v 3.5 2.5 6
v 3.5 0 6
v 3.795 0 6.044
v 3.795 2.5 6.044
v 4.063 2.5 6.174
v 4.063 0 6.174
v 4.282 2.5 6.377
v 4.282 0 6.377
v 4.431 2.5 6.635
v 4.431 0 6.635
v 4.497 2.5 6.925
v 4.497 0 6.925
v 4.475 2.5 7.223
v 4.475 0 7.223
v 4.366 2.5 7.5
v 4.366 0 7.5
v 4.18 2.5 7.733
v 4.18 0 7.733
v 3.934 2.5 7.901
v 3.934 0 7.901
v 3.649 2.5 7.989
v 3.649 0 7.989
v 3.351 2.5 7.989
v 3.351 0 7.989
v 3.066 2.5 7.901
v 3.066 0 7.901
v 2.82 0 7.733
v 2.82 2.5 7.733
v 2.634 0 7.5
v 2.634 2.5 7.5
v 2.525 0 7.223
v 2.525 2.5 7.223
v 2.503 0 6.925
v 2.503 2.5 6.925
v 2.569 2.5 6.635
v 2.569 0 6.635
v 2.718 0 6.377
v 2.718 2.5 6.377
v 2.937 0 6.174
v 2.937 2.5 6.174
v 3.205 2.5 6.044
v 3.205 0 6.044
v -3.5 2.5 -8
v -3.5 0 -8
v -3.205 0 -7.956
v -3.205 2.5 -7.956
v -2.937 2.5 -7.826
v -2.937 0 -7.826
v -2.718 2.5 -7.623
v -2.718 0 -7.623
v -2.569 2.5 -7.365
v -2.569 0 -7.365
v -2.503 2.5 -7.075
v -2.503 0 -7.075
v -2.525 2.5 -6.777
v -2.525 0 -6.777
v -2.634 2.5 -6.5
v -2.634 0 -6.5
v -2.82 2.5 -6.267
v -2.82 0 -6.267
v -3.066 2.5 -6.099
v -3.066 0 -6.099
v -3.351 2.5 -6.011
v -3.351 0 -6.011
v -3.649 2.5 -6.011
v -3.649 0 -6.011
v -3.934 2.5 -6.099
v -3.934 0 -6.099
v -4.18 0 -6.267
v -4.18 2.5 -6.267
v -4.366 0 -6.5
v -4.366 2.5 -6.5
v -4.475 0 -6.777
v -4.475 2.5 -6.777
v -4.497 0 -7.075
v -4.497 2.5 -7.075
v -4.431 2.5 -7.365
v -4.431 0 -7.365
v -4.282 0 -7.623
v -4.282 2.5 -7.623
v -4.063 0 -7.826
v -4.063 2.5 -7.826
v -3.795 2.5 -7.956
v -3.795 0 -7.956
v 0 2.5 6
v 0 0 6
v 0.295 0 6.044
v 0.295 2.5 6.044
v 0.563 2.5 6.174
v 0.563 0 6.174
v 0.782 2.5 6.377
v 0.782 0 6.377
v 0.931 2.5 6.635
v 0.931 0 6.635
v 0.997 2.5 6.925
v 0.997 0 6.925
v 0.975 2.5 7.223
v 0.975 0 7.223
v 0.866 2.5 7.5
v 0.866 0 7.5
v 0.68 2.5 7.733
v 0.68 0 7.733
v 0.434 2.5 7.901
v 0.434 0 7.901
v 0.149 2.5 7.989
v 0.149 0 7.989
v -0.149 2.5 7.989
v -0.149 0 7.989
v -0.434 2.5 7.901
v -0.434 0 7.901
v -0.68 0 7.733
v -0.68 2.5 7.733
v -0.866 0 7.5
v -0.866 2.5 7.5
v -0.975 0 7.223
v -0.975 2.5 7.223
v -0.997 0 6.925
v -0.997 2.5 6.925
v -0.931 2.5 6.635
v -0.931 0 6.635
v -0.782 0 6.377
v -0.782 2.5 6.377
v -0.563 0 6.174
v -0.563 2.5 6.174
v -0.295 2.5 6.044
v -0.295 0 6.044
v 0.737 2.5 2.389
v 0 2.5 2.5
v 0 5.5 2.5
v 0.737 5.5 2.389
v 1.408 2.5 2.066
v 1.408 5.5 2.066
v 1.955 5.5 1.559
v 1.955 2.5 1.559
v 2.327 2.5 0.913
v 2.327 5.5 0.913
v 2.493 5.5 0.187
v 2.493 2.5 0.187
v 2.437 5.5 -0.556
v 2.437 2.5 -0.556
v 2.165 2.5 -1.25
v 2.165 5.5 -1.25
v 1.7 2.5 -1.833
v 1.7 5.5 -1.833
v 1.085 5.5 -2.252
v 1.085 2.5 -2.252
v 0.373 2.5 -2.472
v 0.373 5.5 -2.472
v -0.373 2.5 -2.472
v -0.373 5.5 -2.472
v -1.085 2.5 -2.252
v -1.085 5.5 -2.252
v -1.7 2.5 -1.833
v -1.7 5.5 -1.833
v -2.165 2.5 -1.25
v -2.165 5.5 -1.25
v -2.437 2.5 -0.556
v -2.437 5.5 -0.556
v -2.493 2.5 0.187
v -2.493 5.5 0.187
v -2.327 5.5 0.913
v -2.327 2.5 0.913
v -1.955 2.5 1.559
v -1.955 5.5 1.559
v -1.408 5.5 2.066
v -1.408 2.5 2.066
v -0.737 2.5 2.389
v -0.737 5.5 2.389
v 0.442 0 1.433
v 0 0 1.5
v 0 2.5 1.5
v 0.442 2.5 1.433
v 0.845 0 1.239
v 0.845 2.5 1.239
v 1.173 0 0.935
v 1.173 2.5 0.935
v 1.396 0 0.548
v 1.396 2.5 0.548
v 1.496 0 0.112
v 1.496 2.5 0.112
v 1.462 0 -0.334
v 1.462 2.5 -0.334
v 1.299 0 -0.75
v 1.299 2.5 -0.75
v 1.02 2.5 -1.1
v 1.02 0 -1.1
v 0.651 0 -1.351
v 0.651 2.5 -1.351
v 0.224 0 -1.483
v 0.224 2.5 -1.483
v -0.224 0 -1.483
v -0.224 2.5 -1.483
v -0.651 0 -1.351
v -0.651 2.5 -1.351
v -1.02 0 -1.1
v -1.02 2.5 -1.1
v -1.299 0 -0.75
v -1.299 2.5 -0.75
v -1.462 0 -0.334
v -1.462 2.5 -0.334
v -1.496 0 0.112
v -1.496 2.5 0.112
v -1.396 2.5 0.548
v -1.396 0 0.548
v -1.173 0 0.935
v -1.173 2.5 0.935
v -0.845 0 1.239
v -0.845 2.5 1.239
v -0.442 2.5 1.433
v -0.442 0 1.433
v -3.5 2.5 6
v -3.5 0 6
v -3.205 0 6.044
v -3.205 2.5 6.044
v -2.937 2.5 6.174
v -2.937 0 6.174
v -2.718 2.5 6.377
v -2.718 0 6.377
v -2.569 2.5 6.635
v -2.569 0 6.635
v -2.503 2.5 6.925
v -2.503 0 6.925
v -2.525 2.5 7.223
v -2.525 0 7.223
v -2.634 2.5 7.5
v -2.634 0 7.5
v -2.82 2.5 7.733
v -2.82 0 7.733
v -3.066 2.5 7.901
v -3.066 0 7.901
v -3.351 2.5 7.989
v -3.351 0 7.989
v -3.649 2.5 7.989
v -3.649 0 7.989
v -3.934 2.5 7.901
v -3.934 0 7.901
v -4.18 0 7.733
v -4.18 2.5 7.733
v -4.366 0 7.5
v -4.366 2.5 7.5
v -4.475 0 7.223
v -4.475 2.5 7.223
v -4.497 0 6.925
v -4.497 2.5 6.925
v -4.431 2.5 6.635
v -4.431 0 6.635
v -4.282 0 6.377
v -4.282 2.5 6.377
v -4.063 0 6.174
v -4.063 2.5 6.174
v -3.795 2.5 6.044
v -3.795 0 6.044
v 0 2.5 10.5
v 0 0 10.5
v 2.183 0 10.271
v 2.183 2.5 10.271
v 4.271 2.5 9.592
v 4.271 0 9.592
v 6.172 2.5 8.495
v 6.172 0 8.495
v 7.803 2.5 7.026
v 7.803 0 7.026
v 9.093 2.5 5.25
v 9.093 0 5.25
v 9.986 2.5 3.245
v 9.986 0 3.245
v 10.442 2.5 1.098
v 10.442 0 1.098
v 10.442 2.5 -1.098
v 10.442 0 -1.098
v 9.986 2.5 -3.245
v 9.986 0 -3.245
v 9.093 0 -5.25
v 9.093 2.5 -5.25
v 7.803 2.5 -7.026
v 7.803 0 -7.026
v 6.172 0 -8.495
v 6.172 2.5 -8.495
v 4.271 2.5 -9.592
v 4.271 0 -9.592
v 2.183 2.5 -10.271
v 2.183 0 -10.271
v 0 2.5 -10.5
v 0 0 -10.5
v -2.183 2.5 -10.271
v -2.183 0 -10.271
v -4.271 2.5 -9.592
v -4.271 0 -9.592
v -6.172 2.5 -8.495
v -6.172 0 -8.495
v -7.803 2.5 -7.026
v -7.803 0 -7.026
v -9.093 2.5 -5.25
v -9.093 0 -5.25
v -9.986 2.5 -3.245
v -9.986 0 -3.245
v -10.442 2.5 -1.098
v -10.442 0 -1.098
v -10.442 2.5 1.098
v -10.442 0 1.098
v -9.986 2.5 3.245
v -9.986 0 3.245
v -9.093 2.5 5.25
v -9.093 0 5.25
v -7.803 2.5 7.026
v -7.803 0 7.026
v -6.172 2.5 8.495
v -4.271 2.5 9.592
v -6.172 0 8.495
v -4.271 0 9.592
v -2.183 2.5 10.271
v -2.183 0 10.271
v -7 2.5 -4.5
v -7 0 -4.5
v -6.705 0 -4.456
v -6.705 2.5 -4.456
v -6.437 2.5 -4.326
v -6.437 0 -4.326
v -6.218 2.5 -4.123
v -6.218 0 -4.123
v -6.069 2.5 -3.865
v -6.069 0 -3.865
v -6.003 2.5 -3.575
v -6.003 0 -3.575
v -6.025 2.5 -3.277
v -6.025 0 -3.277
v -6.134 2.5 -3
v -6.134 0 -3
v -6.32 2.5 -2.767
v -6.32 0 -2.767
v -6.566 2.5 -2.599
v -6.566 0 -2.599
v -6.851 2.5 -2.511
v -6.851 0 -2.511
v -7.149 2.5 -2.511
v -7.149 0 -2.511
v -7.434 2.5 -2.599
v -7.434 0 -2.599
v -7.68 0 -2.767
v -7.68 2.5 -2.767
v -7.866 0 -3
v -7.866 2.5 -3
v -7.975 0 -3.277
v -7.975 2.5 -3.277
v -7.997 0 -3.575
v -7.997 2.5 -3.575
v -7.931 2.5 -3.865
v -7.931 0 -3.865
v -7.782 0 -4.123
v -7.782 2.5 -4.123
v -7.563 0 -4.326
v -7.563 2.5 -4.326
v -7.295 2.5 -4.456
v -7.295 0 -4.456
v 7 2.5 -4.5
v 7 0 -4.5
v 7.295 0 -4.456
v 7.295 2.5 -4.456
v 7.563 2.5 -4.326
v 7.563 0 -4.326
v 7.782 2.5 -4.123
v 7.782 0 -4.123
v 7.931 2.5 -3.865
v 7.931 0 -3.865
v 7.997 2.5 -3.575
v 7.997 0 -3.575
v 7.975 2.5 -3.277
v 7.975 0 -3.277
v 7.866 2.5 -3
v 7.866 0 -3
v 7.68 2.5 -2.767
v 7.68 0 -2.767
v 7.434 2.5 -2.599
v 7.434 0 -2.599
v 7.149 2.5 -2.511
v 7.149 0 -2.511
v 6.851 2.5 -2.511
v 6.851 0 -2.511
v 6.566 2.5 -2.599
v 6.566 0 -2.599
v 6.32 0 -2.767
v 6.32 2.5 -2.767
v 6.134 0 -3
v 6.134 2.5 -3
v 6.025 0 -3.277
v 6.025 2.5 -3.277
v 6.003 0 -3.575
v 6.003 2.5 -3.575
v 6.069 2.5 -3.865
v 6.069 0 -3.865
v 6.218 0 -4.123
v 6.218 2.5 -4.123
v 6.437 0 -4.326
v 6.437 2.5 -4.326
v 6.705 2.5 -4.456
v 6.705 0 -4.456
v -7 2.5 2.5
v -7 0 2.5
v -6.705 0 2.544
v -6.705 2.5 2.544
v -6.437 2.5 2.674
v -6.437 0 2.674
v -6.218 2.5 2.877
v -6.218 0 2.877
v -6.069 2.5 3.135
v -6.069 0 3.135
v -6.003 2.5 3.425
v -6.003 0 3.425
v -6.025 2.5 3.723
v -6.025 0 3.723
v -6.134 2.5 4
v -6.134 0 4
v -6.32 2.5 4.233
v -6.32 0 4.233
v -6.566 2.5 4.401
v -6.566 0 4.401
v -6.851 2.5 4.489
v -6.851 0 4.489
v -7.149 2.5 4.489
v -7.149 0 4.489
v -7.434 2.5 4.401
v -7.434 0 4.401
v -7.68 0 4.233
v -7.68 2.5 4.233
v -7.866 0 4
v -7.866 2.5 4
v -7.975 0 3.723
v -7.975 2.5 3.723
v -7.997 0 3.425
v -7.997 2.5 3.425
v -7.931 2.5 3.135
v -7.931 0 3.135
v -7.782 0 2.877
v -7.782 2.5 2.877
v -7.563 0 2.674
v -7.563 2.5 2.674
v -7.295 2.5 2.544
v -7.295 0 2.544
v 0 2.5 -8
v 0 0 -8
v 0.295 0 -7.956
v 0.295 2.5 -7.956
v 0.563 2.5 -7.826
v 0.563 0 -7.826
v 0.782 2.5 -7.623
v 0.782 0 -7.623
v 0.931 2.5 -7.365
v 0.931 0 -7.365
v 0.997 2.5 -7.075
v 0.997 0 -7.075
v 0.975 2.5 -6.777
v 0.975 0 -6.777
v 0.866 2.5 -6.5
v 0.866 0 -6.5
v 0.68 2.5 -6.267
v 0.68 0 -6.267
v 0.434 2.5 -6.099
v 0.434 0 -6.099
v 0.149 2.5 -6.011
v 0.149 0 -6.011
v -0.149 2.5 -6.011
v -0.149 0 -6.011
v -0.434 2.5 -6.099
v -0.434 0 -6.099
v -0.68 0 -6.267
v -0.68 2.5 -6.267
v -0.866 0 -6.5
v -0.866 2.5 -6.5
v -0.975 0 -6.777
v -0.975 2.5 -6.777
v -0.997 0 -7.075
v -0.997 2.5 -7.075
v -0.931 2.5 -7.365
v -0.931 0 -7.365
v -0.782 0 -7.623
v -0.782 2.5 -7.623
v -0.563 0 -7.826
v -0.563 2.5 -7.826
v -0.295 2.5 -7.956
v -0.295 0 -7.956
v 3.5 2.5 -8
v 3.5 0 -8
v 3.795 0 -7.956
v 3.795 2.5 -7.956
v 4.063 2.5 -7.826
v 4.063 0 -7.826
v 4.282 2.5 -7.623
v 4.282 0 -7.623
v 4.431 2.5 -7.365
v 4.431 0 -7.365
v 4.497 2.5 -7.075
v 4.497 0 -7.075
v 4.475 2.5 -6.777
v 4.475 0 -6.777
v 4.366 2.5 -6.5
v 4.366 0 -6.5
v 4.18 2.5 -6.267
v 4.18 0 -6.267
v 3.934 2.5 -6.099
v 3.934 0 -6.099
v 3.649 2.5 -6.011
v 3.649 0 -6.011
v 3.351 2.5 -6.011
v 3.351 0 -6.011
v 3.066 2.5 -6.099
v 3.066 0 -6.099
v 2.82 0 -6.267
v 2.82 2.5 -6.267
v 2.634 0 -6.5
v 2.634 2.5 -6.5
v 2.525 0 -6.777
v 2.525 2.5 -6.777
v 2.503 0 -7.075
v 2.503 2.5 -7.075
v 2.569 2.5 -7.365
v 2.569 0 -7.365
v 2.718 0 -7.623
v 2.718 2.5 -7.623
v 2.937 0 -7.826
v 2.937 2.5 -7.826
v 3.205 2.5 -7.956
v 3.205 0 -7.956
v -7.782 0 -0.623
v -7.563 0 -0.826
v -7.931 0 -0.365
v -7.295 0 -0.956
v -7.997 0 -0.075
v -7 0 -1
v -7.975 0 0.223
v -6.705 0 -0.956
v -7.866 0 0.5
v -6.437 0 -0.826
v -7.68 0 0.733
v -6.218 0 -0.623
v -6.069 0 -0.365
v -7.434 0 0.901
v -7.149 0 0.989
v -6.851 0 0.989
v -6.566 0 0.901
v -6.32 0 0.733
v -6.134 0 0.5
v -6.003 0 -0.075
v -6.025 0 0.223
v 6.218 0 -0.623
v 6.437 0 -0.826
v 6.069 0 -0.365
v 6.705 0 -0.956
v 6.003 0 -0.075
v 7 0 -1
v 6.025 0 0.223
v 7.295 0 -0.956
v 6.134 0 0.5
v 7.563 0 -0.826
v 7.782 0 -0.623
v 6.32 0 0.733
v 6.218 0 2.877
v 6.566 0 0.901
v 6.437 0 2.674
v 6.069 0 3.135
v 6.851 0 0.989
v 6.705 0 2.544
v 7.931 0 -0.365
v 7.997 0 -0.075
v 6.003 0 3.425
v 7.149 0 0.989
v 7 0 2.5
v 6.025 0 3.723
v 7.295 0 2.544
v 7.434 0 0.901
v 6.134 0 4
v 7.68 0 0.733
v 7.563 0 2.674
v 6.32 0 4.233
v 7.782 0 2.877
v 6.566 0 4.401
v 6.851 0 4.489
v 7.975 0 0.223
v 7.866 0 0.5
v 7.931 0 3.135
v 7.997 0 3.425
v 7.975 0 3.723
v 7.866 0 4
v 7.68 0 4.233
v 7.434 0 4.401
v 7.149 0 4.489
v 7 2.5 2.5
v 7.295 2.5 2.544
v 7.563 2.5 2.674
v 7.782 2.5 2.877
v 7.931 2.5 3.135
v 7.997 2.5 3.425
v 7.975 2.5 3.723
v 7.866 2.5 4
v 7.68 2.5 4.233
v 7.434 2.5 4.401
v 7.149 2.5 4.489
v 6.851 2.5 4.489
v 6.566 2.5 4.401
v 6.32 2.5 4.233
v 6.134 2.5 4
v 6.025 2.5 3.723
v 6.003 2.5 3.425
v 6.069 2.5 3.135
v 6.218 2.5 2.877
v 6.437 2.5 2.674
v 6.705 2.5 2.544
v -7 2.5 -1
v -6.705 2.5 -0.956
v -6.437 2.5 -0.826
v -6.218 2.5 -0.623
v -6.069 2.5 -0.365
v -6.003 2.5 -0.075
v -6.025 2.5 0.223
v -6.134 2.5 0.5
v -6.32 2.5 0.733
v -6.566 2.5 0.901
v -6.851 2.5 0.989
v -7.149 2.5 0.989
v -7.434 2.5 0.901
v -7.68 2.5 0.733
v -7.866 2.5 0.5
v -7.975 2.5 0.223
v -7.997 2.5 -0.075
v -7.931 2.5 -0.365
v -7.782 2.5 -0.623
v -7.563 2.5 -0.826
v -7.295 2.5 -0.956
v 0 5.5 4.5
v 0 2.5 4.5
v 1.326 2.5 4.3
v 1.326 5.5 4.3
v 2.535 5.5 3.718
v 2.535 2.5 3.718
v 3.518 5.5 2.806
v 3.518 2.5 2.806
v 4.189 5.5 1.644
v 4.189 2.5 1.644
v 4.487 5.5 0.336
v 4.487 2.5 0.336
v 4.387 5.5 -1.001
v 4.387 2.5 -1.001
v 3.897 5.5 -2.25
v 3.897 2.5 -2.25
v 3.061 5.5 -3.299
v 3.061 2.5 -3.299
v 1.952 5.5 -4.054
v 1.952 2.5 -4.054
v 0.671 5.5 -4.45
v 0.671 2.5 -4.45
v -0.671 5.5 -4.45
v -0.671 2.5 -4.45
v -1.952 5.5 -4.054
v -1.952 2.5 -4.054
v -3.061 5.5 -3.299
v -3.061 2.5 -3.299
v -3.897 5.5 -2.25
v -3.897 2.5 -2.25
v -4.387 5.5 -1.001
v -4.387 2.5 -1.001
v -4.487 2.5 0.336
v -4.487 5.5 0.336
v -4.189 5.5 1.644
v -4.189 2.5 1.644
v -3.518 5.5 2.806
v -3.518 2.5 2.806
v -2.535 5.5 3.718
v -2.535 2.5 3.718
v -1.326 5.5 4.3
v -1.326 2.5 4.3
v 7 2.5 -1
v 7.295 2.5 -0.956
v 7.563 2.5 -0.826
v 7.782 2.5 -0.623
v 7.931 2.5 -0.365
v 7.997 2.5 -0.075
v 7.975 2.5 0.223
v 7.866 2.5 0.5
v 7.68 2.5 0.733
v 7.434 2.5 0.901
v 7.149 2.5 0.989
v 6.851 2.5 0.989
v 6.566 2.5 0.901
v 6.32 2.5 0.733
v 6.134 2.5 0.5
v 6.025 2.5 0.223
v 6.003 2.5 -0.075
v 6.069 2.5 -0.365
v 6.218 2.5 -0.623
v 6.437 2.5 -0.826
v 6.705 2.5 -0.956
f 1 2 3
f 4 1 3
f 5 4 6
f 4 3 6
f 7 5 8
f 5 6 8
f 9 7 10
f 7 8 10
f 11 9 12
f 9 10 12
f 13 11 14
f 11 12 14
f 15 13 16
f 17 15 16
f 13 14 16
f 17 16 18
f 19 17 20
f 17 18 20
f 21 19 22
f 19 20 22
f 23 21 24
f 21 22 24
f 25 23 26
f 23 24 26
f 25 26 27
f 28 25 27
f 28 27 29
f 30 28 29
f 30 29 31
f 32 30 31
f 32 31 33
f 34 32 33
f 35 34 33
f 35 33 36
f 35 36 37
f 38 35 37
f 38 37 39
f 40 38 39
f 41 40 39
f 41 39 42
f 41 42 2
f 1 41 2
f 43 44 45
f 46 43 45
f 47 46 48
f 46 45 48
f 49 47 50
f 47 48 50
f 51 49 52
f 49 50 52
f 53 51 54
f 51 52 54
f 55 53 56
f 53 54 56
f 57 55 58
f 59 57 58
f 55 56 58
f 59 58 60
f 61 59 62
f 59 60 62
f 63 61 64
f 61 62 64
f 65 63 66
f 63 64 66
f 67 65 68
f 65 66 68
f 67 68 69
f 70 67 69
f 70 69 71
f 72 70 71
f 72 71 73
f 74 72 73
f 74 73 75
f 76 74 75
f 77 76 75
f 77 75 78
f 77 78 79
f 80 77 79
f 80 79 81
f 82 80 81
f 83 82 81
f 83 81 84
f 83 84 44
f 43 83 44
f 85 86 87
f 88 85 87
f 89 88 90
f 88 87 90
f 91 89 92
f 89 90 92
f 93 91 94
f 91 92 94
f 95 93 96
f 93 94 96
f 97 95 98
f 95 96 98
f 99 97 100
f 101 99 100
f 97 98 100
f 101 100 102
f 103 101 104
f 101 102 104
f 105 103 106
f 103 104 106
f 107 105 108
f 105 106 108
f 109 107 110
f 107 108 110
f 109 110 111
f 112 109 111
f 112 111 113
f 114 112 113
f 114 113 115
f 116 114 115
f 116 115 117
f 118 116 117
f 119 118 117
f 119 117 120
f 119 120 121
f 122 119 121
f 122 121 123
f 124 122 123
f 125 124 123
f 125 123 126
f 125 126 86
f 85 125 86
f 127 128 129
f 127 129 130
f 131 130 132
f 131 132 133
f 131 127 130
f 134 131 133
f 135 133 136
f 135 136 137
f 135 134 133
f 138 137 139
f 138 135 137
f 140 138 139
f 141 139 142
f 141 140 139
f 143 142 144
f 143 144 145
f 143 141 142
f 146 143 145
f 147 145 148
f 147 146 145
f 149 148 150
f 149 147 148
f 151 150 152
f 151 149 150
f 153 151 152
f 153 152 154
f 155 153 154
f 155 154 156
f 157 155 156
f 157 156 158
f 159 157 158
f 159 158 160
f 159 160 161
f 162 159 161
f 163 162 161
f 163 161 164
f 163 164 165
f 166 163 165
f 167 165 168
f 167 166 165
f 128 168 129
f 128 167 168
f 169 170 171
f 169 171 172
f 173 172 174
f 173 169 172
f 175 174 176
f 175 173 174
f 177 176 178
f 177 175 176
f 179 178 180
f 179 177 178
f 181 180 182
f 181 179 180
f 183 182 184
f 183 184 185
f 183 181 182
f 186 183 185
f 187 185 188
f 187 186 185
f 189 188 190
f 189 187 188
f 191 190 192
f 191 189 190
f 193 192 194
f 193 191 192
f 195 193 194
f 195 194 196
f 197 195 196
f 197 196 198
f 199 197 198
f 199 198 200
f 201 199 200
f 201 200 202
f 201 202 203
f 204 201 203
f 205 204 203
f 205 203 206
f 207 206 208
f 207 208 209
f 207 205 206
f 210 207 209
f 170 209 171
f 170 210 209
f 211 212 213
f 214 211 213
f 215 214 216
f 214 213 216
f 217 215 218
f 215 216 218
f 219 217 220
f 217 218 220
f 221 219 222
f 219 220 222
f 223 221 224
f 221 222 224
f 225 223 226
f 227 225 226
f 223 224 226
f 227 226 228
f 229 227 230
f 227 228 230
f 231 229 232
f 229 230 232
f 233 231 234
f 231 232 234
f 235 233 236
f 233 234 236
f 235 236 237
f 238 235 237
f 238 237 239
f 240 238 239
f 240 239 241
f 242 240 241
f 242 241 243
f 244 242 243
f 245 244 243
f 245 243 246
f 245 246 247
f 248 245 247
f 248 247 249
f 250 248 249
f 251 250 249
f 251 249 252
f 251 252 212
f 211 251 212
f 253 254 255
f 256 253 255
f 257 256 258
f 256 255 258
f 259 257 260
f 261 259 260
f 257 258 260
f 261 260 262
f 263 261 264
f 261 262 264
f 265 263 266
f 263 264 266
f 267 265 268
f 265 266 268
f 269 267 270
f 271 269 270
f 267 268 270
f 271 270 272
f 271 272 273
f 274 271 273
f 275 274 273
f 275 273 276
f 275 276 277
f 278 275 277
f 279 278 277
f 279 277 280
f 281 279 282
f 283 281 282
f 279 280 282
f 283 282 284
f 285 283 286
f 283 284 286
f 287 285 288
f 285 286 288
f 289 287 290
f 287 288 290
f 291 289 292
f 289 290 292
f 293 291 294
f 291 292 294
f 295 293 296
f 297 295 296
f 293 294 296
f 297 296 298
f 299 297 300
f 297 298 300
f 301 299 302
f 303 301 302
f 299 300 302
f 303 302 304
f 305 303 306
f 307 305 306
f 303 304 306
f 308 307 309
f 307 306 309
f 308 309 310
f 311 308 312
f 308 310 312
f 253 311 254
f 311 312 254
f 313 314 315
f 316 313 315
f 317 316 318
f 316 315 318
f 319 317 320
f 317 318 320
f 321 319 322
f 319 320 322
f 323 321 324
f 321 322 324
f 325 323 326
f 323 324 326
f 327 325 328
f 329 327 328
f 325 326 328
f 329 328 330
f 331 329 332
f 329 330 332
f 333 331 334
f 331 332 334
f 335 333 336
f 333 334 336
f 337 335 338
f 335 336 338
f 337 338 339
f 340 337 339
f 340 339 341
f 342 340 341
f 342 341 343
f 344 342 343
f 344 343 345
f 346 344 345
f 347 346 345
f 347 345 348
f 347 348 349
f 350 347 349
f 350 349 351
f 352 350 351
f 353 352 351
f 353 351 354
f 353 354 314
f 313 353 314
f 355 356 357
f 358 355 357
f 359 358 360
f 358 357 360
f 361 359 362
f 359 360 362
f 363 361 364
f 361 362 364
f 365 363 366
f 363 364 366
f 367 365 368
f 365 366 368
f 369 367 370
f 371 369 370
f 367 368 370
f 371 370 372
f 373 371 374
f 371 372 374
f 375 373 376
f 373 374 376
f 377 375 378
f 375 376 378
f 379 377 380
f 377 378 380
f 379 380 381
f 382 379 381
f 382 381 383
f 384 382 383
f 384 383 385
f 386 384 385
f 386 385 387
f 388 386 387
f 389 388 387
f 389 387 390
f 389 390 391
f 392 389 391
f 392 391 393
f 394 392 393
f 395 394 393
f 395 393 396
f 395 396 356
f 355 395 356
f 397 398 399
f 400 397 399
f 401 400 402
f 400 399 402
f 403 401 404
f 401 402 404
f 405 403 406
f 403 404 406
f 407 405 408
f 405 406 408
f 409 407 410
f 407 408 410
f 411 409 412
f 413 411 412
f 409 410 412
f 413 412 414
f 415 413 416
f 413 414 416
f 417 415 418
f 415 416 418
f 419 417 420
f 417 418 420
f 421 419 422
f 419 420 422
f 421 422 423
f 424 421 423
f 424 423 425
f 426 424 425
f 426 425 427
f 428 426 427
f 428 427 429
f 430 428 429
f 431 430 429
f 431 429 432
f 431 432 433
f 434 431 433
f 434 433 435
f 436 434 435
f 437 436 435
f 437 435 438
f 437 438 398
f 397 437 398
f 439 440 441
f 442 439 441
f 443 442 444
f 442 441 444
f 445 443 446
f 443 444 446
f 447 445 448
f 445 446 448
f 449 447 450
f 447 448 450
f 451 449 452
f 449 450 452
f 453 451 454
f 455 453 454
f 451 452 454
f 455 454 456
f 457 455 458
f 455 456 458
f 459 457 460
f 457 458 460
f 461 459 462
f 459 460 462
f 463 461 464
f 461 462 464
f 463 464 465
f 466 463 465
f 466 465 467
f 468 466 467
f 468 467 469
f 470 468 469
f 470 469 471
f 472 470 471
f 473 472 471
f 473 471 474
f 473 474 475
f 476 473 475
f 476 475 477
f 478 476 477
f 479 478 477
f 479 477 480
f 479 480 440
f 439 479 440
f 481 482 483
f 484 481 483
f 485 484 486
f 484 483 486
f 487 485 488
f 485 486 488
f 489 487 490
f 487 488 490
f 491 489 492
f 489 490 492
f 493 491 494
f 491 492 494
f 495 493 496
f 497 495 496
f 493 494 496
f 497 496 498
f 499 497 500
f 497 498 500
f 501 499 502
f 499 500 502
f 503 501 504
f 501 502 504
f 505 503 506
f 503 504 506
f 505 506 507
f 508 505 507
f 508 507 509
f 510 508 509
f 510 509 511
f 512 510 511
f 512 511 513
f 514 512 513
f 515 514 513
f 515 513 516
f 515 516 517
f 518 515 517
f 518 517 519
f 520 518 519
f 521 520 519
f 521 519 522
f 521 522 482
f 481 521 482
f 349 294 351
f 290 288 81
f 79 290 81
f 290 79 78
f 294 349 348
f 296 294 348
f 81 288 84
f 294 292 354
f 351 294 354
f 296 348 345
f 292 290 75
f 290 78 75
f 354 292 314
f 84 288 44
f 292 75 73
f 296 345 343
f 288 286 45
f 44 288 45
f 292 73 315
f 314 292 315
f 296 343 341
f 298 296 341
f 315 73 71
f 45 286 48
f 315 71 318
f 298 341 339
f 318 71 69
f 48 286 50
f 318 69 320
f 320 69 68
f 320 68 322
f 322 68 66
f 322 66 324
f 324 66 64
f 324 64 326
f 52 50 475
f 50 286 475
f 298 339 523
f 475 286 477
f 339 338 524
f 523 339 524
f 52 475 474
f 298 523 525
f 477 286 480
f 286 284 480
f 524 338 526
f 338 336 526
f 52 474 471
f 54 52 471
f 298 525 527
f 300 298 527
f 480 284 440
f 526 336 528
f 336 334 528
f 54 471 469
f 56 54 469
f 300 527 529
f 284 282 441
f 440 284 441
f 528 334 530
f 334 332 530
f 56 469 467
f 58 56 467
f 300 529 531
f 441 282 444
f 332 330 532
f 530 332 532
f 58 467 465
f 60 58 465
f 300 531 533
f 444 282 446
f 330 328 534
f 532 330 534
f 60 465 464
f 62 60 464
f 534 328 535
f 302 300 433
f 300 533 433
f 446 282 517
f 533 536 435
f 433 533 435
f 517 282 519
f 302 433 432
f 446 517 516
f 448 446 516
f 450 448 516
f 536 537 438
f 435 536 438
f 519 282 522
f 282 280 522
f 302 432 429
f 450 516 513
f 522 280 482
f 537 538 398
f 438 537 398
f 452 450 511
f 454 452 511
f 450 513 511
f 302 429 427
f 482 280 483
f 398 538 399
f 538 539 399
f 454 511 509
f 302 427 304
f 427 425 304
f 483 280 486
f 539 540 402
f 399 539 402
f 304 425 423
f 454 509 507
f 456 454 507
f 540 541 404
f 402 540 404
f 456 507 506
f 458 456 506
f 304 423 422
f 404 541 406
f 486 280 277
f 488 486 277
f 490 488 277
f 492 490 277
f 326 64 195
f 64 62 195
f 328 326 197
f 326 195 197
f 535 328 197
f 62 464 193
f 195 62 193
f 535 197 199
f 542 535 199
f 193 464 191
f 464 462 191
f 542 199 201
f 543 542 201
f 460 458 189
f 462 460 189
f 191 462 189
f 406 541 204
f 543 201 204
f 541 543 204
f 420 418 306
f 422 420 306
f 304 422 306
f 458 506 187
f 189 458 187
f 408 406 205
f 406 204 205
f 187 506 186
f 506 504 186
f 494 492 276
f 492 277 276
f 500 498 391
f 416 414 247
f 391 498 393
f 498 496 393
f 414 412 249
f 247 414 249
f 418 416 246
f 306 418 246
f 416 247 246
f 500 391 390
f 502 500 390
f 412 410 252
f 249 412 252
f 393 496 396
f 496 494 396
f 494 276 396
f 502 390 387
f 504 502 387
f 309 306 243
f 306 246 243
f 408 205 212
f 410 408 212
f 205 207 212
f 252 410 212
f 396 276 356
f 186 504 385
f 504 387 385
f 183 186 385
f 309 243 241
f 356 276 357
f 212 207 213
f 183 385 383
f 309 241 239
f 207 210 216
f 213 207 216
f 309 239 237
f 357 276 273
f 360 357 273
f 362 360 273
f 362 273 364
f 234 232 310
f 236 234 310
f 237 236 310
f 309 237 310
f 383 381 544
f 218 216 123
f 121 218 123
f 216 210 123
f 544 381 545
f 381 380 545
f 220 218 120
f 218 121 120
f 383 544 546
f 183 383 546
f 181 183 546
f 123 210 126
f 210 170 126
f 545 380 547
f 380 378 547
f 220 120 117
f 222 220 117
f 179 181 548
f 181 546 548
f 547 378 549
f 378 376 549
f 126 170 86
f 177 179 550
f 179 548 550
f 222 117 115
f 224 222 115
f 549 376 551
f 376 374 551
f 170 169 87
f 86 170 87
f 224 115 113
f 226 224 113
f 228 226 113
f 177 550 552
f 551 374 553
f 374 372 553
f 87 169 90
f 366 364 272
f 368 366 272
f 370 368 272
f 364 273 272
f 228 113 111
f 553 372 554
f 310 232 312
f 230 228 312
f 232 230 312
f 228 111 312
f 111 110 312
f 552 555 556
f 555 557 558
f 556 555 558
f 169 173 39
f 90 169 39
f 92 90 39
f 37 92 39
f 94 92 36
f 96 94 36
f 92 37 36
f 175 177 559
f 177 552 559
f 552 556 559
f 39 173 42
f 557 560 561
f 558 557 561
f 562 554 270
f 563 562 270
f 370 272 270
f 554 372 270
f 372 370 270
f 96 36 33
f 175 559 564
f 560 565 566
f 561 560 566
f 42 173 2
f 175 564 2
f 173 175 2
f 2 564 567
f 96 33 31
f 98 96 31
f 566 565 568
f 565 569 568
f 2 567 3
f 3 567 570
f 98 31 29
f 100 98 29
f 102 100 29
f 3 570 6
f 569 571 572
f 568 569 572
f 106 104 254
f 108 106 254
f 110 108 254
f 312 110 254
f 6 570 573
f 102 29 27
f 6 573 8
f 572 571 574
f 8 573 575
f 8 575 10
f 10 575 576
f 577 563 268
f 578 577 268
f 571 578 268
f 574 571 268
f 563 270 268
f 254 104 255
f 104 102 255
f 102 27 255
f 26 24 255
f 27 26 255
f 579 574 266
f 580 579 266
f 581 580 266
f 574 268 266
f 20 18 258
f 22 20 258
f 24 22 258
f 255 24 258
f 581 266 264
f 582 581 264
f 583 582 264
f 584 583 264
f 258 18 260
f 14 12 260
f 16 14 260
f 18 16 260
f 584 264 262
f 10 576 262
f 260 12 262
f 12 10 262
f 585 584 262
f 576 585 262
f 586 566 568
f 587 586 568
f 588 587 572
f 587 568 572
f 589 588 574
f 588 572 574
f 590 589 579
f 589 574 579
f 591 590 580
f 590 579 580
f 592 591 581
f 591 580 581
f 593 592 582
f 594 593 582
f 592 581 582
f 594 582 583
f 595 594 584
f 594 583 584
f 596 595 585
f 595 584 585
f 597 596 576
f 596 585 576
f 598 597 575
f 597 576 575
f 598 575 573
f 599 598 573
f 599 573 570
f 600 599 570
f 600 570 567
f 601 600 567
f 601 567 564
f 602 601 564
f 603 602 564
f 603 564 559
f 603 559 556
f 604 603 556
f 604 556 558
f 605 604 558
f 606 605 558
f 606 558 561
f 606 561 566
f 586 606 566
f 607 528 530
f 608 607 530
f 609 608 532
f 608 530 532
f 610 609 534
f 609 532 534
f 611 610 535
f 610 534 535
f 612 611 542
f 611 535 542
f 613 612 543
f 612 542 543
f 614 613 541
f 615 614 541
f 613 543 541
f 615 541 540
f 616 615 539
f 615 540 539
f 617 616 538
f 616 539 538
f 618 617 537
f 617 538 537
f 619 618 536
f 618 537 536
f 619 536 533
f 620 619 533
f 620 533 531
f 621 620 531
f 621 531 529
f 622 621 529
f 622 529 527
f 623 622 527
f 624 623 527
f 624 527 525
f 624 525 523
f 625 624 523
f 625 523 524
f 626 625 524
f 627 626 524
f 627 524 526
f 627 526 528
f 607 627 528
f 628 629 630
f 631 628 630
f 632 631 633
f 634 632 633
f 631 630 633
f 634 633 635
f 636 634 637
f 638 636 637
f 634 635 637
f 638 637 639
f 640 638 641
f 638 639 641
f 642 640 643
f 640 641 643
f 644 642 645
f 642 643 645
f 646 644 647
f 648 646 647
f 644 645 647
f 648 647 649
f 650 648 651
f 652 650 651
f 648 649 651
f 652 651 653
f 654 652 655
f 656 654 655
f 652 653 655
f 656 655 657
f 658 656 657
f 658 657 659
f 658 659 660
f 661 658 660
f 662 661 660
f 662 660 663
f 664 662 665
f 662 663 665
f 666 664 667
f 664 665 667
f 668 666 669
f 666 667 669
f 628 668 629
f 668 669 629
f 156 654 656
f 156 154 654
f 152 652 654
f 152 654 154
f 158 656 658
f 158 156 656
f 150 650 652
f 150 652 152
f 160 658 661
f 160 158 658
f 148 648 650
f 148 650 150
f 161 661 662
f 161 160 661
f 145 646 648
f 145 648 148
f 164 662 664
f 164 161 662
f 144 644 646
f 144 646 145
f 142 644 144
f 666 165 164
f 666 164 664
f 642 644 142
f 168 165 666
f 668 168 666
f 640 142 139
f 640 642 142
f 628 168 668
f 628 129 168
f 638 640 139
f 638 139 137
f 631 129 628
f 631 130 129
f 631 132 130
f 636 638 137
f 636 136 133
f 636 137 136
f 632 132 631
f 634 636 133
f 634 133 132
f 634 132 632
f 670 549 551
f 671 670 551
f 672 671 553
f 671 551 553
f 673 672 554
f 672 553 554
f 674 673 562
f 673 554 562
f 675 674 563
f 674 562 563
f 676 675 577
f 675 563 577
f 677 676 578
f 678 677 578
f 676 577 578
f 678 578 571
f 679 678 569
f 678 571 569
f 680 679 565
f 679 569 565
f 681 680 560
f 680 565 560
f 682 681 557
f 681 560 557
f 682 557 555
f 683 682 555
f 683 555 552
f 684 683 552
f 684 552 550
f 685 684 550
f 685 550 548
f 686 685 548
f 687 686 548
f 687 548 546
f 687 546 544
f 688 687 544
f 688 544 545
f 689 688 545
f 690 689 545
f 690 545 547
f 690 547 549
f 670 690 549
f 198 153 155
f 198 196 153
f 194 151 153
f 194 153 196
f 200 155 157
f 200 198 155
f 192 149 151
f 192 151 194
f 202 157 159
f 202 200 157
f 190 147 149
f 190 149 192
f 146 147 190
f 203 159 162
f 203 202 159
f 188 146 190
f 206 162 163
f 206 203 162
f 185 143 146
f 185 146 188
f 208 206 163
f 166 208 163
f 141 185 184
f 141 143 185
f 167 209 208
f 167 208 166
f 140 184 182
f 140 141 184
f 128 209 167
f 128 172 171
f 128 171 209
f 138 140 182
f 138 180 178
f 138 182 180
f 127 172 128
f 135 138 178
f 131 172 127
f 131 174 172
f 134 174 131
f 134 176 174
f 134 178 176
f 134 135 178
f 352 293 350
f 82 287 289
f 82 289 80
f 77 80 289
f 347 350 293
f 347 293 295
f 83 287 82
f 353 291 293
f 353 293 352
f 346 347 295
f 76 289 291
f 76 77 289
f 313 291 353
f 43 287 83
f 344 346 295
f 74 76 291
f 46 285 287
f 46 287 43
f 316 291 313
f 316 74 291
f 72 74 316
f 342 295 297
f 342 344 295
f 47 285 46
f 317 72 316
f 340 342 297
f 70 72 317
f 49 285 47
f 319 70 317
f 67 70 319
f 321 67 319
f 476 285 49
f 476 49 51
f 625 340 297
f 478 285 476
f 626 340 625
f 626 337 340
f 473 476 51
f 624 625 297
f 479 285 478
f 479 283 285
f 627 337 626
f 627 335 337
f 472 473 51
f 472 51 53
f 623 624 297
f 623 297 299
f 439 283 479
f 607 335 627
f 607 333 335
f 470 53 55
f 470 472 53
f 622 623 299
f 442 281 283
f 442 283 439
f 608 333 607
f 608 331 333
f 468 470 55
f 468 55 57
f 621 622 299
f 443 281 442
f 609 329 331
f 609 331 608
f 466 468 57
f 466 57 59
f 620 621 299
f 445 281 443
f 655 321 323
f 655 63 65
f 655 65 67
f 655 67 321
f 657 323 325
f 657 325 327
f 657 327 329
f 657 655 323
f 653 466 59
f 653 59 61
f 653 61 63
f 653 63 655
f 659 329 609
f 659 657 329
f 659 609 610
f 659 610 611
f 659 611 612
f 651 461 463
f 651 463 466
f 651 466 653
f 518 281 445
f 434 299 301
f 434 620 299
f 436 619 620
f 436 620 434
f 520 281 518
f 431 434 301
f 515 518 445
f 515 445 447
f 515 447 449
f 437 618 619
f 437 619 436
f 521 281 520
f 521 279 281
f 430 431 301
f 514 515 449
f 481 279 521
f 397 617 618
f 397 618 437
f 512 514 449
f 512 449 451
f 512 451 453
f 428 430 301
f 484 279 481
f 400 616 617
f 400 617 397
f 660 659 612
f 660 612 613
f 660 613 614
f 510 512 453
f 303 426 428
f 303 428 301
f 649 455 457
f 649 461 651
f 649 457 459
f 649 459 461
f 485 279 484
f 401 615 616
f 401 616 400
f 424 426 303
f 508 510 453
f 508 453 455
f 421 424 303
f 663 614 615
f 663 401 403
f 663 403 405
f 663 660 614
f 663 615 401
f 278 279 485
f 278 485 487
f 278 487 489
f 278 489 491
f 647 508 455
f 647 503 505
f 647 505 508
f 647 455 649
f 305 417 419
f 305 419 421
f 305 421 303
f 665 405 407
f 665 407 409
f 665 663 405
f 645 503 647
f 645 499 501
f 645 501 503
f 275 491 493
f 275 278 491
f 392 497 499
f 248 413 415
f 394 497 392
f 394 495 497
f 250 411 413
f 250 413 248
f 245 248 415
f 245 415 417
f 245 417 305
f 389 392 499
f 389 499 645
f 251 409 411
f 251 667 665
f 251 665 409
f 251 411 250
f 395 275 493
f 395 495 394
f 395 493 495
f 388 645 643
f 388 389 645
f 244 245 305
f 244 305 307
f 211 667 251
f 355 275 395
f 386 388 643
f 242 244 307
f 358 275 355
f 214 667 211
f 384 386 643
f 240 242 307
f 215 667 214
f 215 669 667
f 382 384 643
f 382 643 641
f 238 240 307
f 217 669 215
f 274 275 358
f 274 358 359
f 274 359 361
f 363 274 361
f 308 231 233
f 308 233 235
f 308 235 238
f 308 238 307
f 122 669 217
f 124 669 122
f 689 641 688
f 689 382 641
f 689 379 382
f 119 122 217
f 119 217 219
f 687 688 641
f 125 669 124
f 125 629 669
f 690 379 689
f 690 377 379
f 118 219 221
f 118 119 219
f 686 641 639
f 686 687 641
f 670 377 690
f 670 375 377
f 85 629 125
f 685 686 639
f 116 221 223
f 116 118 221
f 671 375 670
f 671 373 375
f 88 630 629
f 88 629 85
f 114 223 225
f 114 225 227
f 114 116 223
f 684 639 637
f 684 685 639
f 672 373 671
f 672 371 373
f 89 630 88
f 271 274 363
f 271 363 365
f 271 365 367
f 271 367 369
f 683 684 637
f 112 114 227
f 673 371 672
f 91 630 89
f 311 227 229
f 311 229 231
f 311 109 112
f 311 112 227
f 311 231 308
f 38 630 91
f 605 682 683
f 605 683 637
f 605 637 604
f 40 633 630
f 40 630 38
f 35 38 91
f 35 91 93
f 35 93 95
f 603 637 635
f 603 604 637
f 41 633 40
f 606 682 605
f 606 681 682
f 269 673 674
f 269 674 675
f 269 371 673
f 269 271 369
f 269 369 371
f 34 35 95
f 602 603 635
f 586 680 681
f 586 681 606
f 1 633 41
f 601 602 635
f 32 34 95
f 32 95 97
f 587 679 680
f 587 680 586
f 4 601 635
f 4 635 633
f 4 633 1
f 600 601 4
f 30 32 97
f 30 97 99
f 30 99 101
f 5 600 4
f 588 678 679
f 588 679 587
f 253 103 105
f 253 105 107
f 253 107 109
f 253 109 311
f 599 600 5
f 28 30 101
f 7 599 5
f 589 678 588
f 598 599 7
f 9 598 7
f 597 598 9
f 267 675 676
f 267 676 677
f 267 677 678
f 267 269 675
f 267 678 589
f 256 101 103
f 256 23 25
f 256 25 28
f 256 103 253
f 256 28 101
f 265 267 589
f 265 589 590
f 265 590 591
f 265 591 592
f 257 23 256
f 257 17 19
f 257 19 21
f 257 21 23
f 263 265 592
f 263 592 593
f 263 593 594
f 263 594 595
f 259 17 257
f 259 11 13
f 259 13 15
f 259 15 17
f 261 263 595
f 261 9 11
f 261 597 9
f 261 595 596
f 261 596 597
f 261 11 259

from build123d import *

# Parameters (mm, degrees)
SKETCH1_R           = 10.5
SKETCH1_R_2         = 1.5
BOSS_EXTRUDE1_DEPTH = 2.5
SKETCH2_R           = 4.5
SKETCH2_R_2         = 2.5
BOSS_EXTRUDE2_DEPTH = 3
CUT_EXTRUDE1_REACH  = 17.835
SKETCH3_R           = 1


with BuildPart() as part:
    # Sketch1 → Boss-Extrude1 (new body)
    with BuildSketch(Plane(origin=(0, 0, 0), x_dir=(1, 0, 0), z_dir=(0, 1, 0))):
        with Locations(Location((0, 0, 0), (0, 0, 270))):
            Circle(SKETCH1_R)
        with Locations(Location((0, 0, 0), (0, 0, 270))):
            Circle(SKETCH1_R_2, mode=Mode.SUBTRACT)
    extrude(amount=BOSS_EXTRUDE1_DEPTH)

    # Sketch2 → Boss-Extrude2 (add)
    with BuildSketch(Plane(origin=(0, 2.5, 0), x_dir=(1, 0, 0), z_dir=(0, 1, 0))):
        with Locations(Location((0, 0, 0), (0, 0, 270))):
            Circle(SKETCH2_R)
        with Locations(Location((0, 0, 0), (0, 0, 270))):
            Circle(SKETCH2_R_2, mode=Mode.SUBTRACT)
    extrude(amount=BOSS_EXTRUDE2_DEPTH)

    # Sketch3 → Cut-Extrude1 (cut, up to next)
    with BuildSketch(Plane.XZ, mode=Mode.PRIVATE) as cut_extrude1_sk1:
        with Locations(Location((-3.5, 7, 0), (0, 0, 270))):
            Circle(SKETCH3_R)
    cut_extrude1_tool1 = extrude(cut_extrude1_sk1.sketch, amount=-CUT_EXTRUDE1_REACH, mode=Mode.PRIVATE) & part.part
    # Sketch3 → Cut-Extrude1 (cut, up to next)
    with BuildSketch(Plane.XZ, mode=Mode.PRIVATE) as cut_extrude1_sk2:
        with Locations(Location((0, 7, 0), (0, 0, 270))):
            Circle(SKETCH3_R)
    cut_extrude1_tool2 = extrude(cut_extrude1_sk2.sketch, amount=-CUT_EXTRUDE1_REACH, mode=Mode.PRIVATE) & part.part
    # Sketch3 → Cut-Extrude1 (cut, up to next)
    with BuildSketch(Plane.XZ, mode=Mode.PRIVATE) as cut_extrude1_sk3:
        with Locations(Location((3.5, 7, 0), (0, 0, 270))):
            Circle(SKETCH3_R)
    cut_extrude1_tool3 = extrude(cut_extrude1_sk3.sketch, amount=-CUT_EXTRUDE1_REACH, mode=Mode.PRIVATE) & part.part
    # Sketch3 → Cut-Extrude1 (cut, up to next)
    with BuildSketch(Plane.XZ, mode=Mode.PRIVATE) as cut_extrude1_sk4:
        with Locations(Location((7, -3.5, 0), (0, 0, 270))):
            Circle(SKETCH3_R)
    cut_extrude1_tool4 = extrude(cut_extrude1_sk4.sketch, amount=-CUT_EXTRUDE1_REACH, mode=Mode.PRIVATE) & part.part
    # Sketch3 → Cut-Extrude1 (cut, up to next)
    with BuildSketch(Plane.XZ, mode=Mode.PRIVATE) as cut_extrude1_sk5:
        with Locations(Location((7, 0, 0), (0, 0, 270))):
            Circle(SKETCH3_R)
    cut_extrude1_tool5 = extrude(cut_extrude1_sk5.sketch, amount=-CUT_EXTRUDE1_REACH, mode=Mode.PRIVATE) & part.part
    # Sketch3 → Cut-Extrude1 (cut, up to next)
    with BuildSketch(Plane.XZ, mode=Mode.PRIVATE) as cut_extrude1_sk6:
        with Locations(Location((7, 3.5, 0), (0, 0, 270))):
            Circle(SKETCH3_R)
    cut_extrude1_tool6 = extrude(cut_extrude1_sk6.sketch, amount=-CUT_EXTRUDE1_REACH, mode=Mode.PRIVATE) & part.part
    # Sketch3 → Cut-Extrude1 (cut, up to next)
    with BuildSketch(Plane.XZ, mode=Mode.PRIVATE) as cut_extrude1_sk7:
        with Locations(Location((-3.5, -7, 0), (0, 0, 270))):
            Circle(SKETCH3_R)
    cut_extrude1_tool7 = extrude(cut_extrude1_sk7.sketch, amount=-CUT_EXTRUDE1_REACH, mode=Mode.PRIVATE) & part.part
    # Sketch3 → Cut-Extrude1 (cut, up to next)
    with BuildSketch(Plane.XZ, mode=Mode.PRIVATE) as cut_extrude1_sk8:
        with Locations(Location((0, -7, 0), (0, 0, 270))):
            Circle(SKETCH3_R)
    cut_extrude1_tool8 = extrude(cut_extrude1_sk8.sketch, amount=-CUT_EXTRUDE1_REACH, mode=Mode.PRIVATE) & part.part
    # Sketch3 → Cut-Extrude1 (cut, up to next)
    with BuildSketch(Plane.XZ, mode=Mode.PRIVATE) as cut_extrude1_sk9:
        with Locations(Location((3.5, -7, 0), (0, 0, 270))):
            Circle(SKETCH3_R)
    cut_extrude1_tool9 = extrude(cut_extrude1_sk9.sketch, amount=-CUT_EXTRUDE1_REACH, mode=Mode.PRIVATE) & part.part
    # Sketch3 → Cut-Extrude1 (cut, up to next)
    with BuildSketch(Plane.XZ, mode=Mode.PRIVATE) as cut_extrude1_sk10:
        with Locations(Location((-7, 3.5, 0), (0, 0, 270))):
            Circle(SKETCH3_R)
    cut_extrude1_tool10 = extrude(cut_extrude1_sk10.sketch, amount=-CUT_EXTRUDE1_REACH, mode=Mode.PRIVATE) & part.part
    # Sketch3 → Cut-Extrude1 (cut, up to next)
    with BuildSketch(Plane.XZ, mode=Mode.PRIVATE) as cut_extrude1_sk11:
        with Locations(Location((-7, 0, 0), (0, 0, 270))):
            Circle(SKETCH3_R)
    cut_extrude1_tool11 = extrude(cut_extrude1_sk11.sketch, amount=-CUT_EXTRUDE1_REACH, mode=Mode.PRIVATE) & part.part
    # Sketch3 → Cut-Extrude1 (cut, up to next)
    with BuildSketch(Plane.XZ, mode=Mode.PRIVATE) as cut_extrude1_sk12:
        with Locations(Location((-7, -3.5, 0), (0, 0, 270))):
            Circle(SKETCH3_R)
    cut_extrude1_tool12 = extrude(cut_extrude1_sk12.sketch, amount=-CUT_EXTRUDE1_REACH, mode=Mode.PRIVATE) & part.part
    add(cut_extrude1_tool1.solids().sort_by_distance((-3.5, 0, 7))[0], mode=Mode.SUBTRACT)
    add(cut_extrude1_tool2.solids().sort_by_distance((0, 0, 7))[0], mode=Mode.SUBTRACT)
    add(cut_extrude1_tool3.solids().sort_by_distance((3.5, 0, 7))[0], mode=Mode.SUBTRACT)
    add(cut_extrude1_tool4.solids().sort_by_distance((7, 0, -3.5))[0], mode=Mode.SUBTRACT)
    add(cut_extrude1_tool5.solids().sort_by_distance((7, 0, 0))[0], mode=Mode.SUBTRACT)
    add(cut_extrude1_tool6.solids().sort_by_distance((7, 0, 3.5))[0], mode=Mode.SUBTRACT)
    add(cut_extrude1_tool7.solids().sort_by_distance((-3.5, 0, -7))[0], mode=Mode.SUBTRACT)
    add(cut_extrude1_tool8.solids().sort_by_distance((0, 0, -7))[0], mode=Mode.SUBTRACT)
    add(cut_extrude1_tool9.solids().sort_by_distance((3.5, 0, -7))[0], mode=Mode.SUBTRACT)
    add(cut_extrude1_tool10.solids().sort_by_distance((-7, 0, 3.5))[0], mode=Mode.SUBTRACT)
    add(cut_extrude1_tool11.solids().sort_by_distance((-7, 0, 0))[0], mode=Mode.SUBTRACT)
    add(cut_extrude1_tool12.solids().sort_by_distance((-7, 0, -3.5))[0], mode=Mode.SUBTRACT)


solid = part.part
